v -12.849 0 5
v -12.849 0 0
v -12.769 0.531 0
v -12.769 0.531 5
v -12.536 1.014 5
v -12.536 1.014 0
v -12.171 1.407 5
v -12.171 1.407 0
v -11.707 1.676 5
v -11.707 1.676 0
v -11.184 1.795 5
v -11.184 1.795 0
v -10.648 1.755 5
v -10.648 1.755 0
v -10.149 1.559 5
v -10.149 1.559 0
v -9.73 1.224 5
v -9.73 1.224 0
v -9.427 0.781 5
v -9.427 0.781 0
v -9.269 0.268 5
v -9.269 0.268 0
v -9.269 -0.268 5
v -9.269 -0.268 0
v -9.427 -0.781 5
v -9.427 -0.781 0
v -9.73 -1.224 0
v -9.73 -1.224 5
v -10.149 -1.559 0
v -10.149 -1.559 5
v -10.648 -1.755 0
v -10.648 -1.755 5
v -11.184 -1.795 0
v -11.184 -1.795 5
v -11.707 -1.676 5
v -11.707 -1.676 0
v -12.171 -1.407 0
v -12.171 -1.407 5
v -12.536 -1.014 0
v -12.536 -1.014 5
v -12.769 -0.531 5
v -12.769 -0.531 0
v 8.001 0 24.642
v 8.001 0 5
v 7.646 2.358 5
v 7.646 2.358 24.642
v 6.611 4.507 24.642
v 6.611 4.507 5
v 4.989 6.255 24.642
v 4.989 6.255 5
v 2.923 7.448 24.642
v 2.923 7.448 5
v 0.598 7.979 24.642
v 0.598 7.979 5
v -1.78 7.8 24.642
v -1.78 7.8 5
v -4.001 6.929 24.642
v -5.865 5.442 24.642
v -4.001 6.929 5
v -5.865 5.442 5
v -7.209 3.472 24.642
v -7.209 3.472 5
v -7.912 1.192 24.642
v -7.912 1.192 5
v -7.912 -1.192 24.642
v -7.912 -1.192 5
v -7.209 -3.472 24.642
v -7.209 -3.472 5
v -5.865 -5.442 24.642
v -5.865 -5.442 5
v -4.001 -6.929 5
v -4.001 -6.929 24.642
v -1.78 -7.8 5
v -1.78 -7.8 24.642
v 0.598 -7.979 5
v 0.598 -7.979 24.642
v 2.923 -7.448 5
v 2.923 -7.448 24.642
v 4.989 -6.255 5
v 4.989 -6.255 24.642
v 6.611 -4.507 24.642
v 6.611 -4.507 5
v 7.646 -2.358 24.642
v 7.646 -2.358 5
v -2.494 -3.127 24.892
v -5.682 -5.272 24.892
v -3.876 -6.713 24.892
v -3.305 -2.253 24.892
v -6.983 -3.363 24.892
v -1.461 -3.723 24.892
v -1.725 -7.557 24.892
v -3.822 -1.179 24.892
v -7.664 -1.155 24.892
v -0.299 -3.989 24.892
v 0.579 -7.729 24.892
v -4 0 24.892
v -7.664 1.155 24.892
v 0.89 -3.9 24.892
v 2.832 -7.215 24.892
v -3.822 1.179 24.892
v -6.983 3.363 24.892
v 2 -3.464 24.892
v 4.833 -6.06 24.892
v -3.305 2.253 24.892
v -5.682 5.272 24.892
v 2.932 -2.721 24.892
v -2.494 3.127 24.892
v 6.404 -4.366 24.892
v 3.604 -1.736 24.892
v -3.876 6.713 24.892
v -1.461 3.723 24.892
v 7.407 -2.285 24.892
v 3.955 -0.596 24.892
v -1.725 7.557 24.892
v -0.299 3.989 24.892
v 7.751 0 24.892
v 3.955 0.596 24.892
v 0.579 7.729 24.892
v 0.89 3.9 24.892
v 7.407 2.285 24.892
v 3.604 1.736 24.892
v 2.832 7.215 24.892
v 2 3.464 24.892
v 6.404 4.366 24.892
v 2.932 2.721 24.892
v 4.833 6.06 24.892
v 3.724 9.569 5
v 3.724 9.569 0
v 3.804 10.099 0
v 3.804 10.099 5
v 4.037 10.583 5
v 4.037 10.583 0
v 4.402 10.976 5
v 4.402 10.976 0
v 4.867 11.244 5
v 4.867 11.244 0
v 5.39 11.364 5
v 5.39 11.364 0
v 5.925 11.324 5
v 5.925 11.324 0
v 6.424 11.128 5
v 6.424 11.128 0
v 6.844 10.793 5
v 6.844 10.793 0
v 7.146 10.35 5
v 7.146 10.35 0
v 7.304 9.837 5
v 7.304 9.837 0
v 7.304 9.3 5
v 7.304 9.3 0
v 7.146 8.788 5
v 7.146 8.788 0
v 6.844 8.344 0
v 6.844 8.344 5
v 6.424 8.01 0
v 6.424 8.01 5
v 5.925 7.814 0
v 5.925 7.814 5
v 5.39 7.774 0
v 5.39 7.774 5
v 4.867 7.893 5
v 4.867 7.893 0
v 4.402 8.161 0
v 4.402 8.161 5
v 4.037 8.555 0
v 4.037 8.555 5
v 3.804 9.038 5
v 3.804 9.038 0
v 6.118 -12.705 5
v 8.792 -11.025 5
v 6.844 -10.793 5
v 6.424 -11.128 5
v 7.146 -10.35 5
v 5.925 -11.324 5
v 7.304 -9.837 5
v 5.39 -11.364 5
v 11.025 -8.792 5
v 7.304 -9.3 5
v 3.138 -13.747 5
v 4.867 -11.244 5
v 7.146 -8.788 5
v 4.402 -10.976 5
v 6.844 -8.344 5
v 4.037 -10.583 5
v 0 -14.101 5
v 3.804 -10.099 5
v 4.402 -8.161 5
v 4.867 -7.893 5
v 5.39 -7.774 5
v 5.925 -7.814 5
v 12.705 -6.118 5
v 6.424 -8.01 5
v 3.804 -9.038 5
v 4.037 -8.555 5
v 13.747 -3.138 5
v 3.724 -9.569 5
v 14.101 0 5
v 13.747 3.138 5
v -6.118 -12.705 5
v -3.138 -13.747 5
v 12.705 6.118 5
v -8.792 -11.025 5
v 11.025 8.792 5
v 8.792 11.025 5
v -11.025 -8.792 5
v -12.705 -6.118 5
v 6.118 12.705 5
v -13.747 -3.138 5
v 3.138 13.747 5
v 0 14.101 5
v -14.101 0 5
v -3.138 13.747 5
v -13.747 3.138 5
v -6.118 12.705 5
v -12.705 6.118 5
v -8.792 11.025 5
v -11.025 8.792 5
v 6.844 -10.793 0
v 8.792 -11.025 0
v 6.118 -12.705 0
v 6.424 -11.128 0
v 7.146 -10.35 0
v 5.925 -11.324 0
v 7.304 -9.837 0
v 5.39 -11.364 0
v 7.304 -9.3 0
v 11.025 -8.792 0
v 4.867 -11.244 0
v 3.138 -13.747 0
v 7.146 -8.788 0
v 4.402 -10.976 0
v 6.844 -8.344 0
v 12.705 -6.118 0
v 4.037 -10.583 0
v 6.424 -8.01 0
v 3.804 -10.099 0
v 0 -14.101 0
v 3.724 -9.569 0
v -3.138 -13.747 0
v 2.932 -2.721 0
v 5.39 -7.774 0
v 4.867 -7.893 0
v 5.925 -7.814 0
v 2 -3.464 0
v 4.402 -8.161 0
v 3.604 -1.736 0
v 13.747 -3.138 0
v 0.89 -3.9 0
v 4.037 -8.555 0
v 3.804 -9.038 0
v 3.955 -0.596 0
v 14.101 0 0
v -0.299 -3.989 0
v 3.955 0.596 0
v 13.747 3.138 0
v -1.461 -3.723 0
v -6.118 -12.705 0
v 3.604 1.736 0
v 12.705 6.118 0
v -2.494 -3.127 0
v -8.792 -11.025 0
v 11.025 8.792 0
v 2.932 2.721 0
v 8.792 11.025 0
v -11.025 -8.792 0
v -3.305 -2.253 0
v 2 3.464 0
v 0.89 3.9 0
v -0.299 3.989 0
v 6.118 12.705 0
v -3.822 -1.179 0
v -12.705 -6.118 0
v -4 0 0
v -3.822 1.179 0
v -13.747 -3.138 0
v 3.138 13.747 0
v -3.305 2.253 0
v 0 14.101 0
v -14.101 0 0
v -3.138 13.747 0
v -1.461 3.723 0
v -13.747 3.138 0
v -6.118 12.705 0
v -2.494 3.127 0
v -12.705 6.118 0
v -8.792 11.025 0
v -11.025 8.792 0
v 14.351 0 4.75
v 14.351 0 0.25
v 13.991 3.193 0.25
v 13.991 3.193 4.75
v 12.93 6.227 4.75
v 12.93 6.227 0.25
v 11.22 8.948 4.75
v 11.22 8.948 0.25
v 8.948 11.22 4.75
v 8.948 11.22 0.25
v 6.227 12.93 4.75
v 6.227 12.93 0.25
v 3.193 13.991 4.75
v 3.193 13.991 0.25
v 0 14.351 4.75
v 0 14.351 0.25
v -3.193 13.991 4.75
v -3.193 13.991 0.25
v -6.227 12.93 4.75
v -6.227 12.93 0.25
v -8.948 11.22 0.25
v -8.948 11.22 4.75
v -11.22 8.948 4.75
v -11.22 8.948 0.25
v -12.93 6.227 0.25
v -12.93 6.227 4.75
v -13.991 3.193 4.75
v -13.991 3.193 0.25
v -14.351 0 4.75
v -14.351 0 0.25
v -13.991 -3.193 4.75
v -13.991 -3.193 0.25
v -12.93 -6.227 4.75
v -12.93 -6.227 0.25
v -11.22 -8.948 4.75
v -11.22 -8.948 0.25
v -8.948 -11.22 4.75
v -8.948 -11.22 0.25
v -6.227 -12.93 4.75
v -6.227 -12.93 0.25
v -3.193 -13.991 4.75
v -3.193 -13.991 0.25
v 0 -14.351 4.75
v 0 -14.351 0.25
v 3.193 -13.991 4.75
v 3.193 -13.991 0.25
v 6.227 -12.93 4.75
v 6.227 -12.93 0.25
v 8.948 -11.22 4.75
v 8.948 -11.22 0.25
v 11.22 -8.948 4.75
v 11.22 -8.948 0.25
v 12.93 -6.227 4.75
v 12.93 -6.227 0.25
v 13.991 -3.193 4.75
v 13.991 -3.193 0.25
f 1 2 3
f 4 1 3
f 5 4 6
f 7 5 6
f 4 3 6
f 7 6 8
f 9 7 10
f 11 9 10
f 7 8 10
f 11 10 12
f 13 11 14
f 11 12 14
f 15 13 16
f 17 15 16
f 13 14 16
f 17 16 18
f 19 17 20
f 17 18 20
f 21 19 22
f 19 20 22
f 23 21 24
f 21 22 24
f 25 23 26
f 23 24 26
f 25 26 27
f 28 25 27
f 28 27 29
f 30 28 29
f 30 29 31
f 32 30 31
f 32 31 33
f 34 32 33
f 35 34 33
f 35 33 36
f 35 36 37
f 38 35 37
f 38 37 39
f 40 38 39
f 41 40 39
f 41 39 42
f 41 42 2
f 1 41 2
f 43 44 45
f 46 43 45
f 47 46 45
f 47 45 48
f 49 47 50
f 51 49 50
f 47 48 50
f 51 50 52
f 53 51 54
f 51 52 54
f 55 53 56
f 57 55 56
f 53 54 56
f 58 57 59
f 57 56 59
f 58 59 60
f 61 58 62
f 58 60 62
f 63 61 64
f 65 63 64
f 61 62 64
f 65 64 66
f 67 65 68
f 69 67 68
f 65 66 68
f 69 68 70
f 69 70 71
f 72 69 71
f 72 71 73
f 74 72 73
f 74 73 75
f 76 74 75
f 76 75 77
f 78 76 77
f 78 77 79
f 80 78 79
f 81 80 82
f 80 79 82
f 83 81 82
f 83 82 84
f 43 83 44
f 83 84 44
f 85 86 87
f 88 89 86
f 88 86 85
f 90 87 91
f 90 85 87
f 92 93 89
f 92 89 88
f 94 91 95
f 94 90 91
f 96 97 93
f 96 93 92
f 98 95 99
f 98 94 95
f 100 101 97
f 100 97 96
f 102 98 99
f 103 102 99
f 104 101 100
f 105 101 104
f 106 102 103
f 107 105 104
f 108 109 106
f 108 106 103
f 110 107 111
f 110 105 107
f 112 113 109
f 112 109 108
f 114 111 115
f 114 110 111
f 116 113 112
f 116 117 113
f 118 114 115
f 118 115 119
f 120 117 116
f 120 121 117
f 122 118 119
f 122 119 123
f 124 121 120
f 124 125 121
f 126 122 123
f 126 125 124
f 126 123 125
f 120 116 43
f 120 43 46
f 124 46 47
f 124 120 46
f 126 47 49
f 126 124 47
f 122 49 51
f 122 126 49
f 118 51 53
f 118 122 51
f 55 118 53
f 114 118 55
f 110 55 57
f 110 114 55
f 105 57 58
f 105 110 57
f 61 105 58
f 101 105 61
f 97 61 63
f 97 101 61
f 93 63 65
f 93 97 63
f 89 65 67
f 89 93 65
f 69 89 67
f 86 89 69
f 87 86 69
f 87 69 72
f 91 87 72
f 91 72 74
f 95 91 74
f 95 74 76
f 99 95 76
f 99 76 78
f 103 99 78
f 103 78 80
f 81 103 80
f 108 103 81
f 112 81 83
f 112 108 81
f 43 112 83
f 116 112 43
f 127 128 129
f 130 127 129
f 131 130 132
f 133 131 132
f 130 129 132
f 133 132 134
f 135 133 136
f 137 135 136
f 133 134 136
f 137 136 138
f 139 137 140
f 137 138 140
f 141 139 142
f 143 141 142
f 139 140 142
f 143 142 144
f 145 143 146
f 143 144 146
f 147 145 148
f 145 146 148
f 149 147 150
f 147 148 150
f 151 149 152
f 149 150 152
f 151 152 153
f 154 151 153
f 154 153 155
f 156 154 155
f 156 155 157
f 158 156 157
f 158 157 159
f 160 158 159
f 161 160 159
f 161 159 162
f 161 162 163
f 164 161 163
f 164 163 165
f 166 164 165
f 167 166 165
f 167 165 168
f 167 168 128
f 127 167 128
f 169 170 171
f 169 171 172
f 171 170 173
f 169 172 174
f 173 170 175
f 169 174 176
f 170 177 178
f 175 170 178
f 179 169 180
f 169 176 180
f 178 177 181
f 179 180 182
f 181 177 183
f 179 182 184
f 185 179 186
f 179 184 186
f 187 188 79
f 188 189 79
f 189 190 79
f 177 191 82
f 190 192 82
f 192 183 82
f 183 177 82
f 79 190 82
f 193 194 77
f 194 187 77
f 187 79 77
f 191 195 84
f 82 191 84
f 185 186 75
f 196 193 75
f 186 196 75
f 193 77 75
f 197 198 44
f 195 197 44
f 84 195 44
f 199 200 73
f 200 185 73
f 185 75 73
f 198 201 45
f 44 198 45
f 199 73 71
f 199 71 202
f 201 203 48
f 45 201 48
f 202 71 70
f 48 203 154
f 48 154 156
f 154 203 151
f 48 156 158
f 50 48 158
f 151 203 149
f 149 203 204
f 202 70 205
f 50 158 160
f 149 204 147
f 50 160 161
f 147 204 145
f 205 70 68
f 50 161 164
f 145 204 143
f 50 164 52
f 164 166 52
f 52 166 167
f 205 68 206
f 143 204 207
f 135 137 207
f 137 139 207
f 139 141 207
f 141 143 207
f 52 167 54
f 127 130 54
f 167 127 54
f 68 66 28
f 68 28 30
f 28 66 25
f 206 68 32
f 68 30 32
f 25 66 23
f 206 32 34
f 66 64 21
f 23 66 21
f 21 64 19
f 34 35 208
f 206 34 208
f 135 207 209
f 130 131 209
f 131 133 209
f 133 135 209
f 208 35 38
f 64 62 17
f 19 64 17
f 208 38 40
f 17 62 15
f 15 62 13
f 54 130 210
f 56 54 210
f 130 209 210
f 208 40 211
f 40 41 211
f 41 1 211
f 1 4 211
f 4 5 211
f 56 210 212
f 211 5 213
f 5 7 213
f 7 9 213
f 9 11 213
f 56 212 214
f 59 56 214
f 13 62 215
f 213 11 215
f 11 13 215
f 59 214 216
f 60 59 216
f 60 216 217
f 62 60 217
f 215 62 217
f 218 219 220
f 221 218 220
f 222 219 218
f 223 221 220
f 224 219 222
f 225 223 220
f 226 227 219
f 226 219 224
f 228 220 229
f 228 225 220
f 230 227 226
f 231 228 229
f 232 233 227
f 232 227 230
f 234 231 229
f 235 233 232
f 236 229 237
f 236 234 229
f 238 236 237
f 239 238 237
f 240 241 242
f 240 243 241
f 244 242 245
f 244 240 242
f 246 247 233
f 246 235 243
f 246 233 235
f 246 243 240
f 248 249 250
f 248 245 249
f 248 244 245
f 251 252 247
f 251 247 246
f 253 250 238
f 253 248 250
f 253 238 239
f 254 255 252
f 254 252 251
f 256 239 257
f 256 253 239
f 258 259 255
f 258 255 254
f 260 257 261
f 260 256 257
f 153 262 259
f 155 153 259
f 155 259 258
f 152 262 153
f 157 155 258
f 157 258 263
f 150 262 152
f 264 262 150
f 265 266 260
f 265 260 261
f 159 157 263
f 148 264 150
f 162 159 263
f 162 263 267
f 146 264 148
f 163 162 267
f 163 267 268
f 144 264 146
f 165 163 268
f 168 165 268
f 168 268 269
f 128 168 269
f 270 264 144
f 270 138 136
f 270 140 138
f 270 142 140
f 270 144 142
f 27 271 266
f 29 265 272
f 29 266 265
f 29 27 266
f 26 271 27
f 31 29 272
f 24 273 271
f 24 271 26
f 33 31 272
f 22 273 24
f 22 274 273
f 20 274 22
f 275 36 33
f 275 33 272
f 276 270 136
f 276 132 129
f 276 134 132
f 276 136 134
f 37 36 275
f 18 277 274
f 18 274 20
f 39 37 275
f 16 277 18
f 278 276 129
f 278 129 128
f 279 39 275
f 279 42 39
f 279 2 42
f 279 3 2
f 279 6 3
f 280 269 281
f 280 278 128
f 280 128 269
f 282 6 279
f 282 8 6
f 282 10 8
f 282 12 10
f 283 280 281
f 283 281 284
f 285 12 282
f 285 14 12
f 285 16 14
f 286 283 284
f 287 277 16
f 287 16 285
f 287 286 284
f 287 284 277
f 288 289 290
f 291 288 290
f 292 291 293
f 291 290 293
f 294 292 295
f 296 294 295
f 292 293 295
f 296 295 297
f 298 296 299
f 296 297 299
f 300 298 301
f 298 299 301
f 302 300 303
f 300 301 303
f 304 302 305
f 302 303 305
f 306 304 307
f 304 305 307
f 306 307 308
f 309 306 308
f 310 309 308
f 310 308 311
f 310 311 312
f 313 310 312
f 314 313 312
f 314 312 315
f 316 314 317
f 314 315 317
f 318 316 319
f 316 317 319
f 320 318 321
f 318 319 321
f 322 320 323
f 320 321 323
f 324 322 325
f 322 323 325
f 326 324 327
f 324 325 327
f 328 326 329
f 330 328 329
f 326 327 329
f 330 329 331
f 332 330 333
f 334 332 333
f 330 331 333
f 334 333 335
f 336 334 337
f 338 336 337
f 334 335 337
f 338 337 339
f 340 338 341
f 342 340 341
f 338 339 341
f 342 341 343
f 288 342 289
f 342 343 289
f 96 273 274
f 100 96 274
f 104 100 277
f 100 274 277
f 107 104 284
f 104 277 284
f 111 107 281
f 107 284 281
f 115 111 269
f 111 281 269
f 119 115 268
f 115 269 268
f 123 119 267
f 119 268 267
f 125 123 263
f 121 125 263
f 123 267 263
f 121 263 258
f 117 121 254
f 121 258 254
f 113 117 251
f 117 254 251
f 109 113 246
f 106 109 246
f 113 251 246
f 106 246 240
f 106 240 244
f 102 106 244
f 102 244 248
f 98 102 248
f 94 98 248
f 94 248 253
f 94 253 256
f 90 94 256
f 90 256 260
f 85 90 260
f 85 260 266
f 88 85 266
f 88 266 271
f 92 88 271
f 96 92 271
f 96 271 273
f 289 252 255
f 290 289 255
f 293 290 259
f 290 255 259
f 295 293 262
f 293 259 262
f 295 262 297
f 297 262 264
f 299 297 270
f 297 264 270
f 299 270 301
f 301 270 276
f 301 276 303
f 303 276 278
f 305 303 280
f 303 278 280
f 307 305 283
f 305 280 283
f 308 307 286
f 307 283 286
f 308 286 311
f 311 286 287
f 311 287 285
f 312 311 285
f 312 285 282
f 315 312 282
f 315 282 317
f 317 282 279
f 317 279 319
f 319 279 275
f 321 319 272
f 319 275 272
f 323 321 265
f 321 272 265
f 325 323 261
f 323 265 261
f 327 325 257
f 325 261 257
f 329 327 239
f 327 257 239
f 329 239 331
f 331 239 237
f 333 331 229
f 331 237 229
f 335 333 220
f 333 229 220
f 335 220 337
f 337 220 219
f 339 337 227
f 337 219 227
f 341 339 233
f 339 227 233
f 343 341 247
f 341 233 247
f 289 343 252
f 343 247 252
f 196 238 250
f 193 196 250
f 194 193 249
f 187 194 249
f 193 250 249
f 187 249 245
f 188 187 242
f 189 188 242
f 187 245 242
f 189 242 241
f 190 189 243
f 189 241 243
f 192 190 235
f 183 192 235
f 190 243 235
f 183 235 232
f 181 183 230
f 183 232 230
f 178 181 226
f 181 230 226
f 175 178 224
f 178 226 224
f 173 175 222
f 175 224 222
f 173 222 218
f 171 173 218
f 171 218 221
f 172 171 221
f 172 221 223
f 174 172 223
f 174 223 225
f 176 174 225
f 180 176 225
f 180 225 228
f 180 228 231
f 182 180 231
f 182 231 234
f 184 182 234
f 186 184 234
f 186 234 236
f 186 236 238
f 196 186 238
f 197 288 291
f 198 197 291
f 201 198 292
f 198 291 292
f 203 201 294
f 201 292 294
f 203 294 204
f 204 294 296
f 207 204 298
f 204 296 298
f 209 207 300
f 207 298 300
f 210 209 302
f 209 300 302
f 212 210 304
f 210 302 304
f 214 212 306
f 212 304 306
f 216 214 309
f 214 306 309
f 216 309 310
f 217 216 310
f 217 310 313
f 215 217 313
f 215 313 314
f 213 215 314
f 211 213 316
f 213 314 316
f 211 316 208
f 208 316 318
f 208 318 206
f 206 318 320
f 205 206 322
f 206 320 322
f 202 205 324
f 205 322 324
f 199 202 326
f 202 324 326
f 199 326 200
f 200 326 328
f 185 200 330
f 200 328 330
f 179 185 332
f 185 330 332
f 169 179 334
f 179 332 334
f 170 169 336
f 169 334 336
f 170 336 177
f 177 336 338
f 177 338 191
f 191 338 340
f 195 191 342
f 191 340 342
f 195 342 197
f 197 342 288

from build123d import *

# Parameters (mm, degrees)
SKETCH1_W                  = 14.351
SKETCH1_H                  = 5
SKETCH2_R                  = 8.001
BOSS_EXTRUDE1_DEPTH        = 19.892
F_3_6_3_6_DIAMETER_HOLE1_D = 3.6
F_8_0_8_DIAMETER_HOLE1_D   = 8
CHAMFER1_SIZE              = 0.25


with BuildPart() as part:
    # Sketch1 → Revolve1 (revolve)
    with BuildSketch(Plane(origin=(0, 0, 0), x_dir=(1, 0, 0), z_dir=(0, 1, 0))):
        with Locations((7.1755, -2.5)):
            Rectangle(SKETCH1_W, SKETCH1_H)
    revolve(axis=Axis((0, 0, 0), (0, 0, 1)))

    # Sketch2 → Boss-Extrude1 (add)
    with BuildSketch(Plane.XY.offset(5)):
        Circle(SKETCH2_R)
    extrude(amount=BOSS_EXTRUDE1_DEPTH)

    # Ø3.6 (3.6) Diameter Hole1 (through all)
    with Locations(Plane.XY.offset(5)):
        with Locations((5.5245, -9.568714686), (-11.049, 0), (5.5245, 9.568714686)):
            Hole(F_3_6_3_6_DIAMETER_HOLE1_D / 2)

    # Ø8.0 (8) Diameter Hole1 (through all)
    with Locations(Plane.XY.offset(24.892)):
        with Locations((0, 0)):
            Hole(F_8_0_8_DIAMETER_HOLE1_D / 2)

    # Chamfer1
    chamfer1_edges = [part.edges().sort_by_distance(p)[0] for p in [
        (-14.351, 0, 5),
        (-14.351, 0, 0),
        (-8.001, 0, 24.892),
    ]]
    chamfer(chamfer1_edges, length=CHAMFER1_SIZE)


solid = part.part
